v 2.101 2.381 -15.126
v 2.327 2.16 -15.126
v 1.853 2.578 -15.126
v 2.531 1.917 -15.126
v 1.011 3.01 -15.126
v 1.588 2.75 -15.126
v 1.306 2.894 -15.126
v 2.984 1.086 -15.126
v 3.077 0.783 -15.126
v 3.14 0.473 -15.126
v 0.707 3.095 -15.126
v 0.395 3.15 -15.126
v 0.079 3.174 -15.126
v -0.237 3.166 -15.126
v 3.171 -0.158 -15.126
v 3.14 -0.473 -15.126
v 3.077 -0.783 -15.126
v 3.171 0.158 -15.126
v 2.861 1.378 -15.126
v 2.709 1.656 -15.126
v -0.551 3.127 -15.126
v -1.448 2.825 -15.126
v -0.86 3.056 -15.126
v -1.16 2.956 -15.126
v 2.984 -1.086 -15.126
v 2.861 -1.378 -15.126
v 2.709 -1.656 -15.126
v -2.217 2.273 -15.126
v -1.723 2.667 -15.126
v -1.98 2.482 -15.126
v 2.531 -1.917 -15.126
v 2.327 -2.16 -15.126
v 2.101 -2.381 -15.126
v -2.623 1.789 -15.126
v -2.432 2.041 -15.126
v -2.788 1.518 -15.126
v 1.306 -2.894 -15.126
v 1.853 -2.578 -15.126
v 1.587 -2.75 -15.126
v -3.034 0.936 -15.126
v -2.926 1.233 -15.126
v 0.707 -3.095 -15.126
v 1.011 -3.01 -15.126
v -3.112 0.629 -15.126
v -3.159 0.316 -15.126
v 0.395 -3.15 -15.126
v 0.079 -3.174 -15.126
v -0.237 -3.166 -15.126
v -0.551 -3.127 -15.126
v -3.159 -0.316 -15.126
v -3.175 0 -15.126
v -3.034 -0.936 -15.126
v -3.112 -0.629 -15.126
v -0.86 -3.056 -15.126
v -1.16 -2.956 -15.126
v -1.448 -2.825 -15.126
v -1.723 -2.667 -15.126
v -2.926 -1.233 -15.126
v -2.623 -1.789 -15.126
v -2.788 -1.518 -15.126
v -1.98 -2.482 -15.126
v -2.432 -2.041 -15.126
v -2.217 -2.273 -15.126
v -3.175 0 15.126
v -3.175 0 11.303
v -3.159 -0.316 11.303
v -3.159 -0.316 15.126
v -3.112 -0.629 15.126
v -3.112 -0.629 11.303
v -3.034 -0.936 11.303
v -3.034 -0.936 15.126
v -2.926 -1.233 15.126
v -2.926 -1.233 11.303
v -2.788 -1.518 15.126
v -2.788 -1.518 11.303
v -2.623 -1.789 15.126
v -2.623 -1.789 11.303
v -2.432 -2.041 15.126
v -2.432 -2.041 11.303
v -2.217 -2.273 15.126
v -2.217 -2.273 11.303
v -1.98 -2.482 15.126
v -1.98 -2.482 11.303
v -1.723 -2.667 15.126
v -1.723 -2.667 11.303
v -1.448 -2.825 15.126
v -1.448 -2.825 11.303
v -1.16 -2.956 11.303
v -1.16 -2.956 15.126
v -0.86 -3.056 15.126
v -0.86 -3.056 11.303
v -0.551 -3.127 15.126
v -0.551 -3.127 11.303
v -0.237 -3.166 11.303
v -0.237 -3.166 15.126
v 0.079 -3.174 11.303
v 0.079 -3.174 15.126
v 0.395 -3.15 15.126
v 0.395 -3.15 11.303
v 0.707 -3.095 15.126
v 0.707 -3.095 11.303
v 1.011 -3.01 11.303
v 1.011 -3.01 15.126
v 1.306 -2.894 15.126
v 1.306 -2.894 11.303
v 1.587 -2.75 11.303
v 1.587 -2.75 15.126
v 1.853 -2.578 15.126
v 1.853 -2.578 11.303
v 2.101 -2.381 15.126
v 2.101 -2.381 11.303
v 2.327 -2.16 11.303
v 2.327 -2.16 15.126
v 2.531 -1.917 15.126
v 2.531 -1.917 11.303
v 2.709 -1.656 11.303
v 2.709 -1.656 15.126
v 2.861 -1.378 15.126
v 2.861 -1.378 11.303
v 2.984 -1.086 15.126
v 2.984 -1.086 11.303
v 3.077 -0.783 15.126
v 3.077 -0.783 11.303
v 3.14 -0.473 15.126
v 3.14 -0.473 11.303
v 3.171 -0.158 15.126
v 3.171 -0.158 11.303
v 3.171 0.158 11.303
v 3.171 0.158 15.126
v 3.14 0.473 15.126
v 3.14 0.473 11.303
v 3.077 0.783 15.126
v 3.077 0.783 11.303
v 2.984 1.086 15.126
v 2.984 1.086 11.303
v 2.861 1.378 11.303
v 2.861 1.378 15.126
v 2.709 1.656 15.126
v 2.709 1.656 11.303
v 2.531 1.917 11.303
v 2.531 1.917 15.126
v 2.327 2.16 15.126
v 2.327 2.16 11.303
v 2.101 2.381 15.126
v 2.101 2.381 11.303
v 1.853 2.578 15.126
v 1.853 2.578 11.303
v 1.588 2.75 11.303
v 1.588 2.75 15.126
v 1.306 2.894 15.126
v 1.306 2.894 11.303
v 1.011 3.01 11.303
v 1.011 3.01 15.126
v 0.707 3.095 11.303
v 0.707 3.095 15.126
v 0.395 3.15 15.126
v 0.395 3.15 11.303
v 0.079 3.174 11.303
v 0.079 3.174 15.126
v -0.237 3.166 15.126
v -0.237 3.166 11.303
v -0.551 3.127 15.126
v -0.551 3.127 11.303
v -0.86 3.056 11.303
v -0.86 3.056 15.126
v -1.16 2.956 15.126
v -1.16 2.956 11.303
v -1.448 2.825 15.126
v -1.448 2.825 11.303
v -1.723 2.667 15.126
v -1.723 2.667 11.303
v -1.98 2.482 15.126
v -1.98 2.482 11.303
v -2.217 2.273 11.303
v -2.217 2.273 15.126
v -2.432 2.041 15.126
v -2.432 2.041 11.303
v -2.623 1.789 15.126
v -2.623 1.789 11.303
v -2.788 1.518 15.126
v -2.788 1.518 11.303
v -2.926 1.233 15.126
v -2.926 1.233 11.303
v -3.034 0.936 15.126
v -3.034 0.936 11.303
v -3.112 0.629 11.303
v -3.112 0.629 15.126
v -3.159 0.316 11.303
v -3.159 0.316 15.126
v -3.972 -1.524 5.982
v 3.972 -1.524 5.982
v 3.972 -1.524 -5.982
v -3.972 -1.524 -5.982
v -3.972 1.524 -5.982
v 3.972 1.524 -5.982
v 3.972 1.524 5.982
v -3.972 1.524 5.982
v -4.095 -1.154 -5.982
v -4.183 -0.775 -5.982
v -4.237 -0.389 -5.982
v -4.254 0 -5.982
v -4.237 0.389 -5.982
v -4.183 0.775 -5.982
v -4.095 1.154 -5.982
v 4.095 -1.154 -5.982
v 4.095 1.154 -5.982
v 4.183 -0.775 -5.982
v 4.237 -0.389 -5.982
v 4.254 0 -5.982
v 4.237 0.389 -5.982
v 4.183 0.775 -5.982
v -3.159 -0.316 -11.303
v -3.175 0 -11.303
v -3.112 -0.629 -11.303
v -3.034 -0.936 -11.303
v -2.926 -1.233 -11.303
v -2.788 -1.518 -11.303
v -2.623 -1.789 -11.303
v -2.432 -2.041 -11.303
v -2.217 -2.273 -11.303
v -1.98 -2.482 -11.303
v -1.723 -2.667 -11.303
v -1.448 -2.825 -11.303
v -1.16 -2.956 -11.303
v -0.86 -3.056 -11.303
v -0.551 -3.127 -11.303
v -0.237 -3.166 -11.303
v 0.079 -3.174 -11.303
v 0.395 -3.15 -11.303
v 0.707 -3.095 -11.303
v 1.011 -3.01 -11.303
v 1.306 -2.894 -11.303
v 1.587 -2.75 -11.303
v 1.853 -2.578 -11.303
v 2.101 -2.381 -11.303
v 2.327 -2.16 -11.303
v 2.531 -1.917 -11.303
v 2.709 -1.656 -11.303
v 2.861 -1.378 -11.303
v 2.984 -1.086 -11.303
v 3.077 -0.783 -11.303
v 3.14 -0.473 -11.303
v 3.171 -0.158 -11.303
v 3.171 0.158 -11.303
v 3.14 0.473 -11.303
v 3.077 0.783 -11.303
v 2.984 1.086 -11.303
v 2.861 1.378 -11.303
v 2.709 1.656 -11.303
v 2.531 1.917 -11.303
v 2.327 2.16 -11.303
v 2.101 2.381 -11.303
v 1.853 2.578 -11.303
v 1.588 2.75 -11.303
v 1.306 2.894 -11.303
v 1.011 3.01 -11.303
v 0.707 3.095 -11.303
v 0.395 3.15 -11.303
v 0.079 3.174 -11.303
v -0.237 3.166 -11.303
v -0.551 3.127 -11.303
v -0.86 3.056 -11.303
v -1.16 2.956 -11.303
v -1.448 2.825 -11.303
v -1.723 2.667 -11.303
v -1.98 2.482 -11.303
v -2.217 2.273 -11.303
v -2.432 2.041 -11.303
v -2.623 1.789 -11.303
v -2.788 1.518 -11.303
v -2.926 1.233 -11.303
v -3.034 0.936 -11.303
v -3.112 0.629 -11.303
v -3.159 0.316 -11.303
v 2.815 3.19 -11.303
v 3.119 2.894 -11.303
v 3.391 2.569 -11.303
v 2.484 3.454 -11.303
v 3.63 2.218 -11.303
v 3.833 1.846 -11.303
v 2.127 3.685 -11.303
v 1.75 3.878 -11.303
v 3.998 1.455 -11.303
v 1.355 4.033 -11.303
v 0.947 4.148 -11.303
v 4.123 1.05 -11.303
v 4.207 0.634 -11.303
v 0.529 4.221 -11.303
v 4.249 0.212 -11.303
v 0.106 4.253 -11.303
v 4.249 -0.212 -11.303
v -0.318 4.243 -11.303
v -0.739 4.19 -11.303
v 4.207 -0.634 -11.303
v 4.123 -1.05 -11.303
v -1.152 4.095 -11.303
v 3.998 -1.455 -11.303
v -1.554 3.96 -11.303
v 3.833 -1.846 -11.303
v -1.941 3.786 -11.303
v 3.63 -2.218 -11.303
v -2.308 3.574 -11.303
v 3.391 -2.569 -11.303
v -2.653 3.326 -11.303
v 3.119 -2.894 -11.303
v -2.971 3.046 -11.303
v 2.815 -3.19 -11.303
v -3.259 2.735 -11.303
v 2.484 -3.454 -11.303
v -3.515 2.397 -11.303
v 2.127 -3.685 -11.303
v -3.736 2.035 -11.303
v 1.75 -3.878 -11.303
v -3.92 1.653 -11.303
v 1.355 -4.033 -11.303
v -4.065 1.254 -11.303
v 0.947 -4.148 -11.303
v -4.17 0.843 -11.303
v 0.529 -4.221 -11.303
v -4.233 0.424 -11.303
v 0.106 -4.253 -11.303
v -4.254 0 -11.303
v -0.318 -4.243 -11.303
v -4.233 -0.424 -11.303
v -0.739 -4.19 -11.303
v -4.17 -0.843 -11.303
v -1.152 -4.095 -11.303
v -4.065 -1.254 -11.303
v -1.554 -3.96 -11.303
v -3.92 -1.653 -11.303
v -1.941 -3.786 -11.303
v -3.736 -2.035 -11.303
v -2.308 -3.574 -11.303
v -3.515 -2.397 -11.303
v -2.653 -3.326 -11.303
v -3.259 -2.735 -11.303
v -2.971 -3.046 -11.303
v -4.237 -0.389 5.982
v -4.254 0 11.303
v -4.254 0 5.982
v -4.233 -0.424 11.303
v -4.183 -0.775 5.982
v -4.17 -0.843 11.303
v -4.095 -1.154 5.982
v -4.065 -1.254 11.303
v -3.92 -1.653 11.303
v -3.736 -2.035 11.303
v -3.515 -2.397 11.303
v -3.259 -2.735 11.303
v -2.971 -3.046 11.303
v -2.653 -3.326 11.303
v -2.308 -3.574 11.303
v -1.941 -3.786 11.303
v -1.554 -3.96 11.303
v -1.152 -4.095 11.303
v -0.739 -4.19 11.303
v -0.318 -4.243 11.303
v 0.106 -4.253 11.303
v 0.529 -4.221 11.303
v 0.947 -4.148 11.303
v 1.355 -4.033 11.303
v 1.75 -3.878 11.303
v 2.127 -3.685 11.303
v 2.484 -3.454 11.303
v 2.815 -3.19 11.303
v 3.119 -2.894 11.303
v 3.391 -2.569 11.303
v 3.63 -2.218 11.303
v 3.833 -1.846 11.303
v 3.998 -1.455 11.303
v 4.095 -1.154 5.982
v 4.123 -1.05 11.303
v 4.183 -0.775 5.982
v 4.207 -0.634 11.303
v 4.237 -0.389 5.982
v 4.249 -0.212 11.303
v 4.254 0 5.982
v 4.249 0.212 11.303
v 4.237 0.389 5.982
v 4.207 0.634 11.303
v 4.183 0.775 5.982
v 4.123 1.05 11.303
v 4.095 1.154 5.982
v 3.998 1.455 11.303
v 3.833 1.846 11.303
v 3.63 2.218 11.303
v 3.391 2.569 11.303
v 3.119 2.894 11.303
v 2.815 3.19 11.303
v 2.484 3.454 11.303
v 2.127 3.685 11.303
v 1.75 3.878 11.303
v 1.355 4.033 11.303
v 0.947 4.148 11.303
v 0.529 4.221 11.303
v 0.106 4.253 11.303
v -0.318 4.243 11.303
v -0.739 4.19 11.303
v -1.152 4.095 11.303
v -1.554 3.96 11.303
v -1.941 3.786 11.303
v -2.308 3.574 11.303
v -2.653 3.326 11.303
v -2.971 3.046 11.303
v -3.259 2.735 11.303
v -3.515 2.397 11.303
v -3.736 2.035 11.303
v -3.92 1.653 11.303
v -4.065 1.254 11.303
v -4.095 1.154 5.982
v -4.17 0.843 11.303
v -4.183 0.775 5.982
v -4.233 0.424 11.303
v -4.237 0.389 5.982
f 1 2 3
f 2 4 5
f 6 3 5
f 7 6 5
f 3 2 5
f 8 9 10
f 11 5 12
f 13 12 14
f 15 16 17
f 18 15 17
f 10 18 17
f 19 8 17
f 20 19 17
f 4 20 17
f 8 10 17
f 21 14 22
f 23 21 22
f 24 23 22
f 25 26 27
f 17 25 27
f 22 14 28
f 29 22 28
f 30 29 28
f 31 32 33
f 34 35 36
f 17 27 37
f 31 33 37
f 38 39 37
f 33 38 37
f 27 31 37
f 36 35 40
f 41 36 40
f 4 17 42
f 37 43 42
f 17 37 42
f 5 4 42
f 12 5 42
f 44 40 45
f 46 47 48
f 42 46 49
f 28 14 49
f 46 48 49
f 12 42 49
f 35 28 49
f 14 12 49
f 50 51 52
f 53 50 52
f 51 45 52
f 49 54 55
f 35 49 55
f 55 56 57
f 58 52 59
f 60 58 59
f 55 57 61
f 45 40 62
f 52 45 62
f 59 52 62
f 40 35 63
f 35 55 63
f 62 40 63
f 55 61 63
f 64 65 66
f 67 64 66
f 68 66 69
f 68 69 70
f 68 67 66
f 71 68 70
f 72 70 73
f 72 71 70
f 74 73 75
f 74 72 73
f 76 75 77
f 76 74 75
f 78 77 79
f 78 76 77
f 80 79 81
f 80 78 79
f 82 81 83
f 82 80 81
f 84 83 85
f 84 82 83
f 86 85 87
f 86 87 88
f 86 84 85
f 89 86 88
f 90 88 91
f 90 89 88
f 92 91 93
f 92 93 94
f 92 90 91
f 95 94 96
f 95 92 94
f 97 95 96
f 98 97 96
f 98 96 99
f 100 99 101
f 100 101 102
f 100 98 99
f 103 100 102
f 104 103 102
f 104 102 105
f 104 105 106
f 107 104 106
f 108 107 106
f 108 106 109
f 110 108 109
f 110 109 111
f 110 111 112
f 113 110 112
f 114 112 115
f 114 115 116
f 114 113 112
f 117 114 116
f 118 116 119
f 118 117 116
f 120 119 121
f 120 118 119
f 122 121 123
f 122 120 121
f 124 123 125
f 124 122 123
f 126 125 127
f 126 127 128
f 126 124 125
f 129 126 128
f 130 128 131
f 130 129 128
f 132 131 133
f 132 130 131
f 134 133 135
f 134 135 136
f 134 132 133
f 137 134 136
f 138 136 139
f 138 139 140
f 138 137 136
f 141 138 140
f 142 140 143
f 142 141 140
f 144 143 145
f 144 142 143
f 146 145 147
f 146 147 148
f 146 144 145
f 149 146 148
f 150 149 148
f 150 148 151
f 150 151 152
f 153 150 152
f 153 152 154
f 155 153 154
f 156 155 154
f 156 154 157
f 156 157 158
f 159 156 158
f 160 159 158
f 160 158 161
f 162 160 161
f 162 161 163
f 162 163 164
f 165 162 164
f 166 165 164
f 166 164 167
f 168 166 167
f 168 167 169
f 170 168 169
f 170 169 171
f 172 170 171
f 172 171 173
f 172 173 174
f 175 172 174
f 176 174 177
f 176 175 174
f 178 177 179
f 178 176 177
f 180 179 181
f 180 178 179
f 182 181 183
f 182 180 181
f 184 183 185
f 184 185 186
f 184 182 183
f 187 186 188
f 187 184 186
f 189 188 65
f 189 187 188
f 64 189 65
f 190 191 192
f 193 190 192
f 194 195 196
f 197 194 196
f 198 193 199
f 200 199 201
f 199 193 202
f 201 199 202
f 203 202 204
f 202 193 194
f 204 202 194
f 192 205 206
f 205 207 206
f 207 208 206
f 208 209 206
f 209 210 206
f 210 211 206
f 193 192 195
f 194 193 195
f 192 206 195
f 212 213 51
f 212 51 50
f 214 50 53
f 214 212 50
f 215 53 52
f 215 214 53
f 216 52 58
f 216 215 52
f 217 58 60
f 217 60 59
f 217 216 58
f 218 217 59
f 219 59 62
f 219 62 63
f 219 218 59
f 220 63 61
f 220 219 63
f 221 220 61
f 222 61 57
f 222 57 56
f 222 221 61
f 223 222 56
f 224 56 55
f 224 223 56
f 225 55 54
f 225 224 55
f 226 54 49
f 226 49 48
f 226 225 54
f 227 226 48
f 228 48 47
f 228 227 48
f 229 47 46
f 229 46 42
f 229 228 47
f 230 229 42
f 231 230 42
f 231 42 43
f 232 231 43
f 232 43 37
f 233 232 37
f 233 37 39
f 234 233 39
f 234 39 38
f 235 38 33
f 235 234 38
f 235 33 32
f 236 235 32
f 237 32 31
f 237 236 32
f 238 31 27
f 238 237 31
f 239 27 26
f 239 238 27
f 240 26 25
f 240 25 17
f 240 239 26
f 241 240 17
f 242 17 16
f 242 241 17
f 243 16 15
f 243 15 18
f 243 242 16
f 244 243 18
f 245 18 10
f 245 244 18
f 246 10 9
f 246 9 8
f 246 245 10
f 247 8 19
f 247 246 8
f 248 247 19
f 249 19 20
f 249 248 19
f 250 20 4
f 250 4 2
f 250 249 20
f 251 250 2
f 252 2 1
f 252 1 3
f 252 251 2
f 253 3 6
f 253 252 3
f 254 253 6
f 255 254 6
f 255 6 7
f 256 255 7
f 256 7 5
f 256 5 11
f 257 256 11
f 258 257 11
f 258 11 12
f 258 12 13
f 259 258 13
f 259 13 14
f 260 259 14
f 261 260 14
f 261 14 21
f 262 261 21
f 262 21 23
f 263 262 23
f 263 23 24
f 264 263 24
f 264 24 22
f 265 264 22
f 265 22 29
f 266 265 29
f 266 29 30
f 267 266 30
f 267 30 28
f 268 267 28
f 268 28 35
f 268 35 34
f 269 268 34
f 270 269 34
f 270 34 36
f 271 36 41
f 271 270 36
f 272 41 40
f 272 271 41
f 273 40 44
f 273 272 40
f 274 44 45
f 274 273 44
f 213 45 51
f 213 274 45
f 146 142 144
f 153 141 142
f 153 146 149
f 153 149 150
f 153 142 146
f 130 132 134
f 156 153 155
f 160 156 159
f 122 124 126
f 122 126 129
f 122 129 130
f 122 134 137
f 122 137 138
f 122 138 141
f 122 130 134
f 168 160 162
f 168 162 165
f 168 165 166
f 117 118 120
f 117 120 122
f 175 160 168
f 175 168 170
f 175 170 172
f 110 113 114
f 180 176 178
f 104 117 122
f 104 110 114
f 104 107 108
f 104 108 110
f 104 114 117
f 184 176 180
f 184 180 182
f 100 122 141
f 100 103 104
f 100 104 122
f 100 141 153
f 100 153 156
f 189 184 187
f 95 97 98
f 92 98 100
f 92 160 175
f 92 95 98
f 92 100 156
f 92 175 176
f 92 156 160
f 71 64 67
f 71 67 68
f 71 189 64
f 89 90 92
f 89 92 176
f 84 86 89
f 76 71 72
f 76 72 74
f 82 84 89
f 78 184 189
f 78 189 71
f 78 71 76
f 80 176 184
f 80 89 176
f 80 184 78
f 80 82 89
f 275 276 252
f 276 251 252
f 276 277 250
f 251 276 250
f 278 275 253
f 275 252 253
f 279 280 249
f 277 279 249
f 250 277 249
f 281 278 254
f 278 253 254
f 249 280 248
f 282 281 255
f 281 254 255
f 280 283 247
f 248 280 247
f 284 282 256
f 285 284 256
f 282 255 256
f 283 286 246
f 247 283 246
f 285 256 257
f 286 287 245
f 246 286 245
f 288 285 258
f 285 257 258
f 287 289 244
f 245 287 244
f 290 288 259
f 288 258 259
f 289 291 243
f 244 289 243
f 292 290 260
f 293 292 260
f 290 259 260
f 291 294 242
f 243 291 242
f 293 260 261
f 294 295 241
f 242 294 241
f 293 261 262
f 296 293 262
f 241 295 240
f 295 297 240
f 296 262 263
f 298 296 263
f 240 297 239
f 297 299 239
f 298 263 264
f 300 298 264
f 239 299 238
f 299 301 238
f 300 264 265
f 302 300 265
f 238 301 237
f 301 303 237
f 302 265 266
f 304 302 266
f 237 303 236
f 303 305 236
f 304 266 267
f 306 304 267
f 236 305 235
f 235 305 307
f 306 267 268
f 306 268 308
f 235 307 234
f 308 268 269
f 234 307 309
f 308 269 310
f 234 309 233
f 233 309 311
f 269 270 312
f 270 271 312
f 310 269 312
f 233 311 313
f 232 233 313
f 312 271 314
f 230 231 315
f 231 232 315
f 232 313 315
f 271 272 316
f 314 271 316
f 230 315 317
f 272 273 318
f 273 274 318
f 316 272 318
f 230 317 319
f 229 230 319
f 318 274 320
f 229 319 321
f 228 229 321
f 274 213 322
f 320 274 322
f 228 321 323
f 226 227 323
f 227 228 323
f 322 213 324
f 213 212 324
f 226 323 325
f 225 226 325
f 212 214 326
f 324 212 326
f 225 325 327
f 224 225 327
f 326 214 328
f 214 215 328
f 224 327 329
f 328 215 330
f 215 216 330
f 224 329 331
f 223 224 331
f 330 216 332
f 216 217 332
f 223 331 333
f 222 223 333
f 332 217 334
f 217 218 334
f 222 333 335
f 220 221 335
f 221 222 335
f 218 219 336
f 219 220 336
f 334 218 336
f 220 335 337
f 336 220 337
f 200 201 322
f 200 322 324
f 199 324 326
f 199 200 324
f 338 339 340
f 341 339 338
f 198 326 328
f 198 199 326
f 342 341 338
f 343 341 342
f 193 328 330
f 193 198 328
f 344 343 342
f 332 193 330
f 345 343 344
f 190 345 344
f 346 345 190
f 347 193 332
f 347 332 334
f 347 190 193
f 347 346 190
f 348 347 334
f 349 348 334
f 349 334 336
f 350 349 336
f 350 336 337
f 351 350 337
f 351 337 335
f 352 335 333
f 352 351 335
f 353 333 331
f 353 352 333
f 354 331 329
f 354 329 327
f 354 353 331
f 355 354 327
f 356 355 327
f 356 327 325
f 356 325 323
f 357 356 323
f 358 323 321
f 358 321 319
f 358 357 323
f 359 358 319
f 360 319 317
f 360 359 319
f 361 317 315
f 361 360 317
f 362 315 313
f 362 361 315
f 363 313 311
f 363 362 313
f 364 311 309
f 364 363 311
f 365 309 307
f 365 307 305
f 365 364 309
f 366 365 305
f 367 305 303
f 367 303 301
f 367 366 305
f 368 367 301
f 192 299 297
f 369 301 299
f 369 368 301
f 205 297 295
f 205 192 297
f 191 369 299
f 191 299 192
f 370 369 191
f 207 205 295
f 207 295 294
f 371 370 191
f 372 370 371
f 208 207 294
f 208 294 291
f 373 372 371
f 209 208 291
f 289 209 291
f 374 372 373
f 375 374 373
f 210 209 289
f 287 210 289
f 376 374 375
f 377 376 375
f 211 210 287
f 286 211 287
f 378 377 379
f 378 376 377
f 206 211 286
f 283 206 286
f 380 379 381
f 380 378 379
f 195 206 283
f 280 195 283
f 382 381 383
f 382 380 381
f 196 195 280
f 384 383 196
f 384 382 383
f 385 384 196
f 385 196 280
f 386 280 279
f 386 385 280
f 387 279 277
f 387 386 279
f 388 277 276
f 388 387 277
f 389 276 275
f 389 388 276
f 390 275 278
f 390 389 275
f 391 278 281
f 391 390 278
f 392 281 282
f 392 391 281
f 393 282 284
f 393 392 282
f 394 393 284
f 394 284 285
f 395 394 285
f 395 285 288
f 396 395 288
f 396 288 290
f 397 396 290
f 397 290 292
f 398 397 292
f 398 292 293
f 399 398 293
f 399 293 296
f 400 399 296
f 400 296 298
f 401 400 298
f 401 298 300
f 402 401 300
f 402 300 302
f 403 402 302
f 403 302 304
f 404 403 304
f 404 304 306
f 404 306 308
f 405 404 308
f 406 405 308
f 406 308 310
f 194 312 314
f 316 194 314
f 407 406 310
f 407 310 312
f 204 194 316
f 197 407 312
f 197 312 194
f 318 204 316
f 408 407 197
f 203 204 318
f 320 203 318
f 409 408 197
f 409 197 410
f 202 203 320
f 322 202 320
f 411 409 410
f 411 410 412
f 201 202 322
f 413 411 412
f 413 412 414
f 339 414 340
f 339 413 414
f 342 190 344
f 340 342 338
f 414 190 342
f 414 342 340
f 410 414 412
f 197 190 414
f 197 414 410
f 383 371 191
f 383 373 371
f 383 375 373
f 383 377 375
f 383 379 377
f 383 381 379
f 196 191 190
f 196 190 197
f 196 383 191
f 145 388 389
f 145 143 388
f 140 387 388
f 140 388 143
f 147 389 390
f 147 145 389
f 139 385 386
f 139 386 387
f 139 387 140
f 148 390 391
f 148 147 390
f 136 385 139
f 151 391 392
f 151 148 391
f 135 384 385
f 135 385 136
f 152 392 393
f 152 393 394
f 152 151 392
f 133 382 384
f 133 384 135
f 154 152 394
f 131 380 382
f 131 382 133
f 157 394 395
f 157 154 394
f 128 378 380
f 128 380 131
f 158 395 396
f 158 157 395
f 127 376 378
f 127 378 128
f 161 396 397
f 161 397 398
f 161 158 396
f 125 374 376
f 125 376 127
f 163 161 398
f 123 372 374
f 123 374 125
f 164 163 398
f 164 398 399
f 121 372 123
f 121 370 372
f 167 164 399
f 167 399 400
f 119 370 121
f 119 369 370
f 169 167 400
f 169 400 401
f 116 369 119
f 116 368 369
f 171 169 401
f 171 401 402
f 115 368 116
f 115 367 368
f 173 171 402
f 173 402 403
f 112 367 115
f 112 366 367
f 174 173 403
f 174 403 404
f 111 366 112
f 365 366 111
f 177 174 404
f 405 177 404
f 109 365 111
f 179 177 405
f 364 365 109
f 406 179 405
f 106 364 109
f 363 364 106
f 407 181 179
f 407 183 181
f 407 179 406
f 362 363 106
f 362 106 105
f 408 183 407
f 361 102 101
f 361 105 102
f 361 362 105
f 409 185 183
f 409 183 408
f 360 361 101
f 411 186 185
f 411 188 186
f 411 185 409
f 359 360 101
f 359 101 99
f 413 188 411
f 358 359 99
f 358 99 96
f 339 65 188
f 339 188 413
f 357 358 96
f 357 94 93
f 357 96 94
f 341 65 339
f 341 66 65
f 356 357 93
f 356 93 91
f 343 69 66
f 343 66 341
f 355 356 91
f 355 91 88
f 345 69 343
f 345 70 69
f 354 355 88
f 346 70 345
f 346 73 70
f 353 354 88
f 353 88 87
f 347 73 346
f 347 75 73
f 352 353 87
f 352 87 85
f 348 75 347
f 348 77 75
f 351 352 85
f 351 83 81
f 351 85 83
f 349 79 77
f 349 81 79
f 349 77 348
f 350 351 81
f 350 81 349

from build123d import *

# Parameters (mm, degrees)
SKETCH1_R           = 4.2545
SKETCH1_R_2         = 3.175
BOSS_EXTRUDE1_DEPTH = 11.303
SKETCH2_R           = 3.175
BOSS_EXTRUDE2_DEPTH = 15.1257
SKETCH5_W           = 5.9817
SKETCH5_H           = 3.048
CUT_EXTRUDE2_DEPTH  = 15.1257


with BuildPart() as part:
    # Sketch1 → Boss-Extrude1 (new, symmetric)
    with BuildSketch(Plane.XY):
        with Locations(Location((0, 0, 0), (0, 0, 180))):
            Circle(SKETCH1_R)
        with Locations(Location((0, 0, 0), (0, 0, 180))):
            Circle(SKETCH1_R_2, mode=Mode.SUBTRACT)
    extrude(amount=BOSS_EXTRUDE1_DEPTH, both=True)

    # Sketch2 → Boss-Extrude2 (add, symmetric)
    with BuildSketch(Plane.XY):
        with Locations(Location((0, 0, 0), (0, 0, 180))):
            Circle(SKETCH2_R)
    extrude(amount=BOSS_EXTRUDE2_DEPTH, both=True)

    # Sketch5 → Cut-Extrude2 (cut, symmetric)
    with BuildSketch(Plane(origin=(0, 0, 0), x_dir=(0, 0, -1), z_dir=(1, 0, 0))):
        with Locations((-2.99085, 0)):
            Rectangle(SKETCH5_W, SKETCH5_H)
        with Locations((2.99085, 0)):
            Rectangle(SKETCH5_W, SKETCH5_H)
    extrude(amount=CUT_EXTRUDE2_DEPTH, both=True, mode=Mode.SUBTRACT)


solid = part.part
